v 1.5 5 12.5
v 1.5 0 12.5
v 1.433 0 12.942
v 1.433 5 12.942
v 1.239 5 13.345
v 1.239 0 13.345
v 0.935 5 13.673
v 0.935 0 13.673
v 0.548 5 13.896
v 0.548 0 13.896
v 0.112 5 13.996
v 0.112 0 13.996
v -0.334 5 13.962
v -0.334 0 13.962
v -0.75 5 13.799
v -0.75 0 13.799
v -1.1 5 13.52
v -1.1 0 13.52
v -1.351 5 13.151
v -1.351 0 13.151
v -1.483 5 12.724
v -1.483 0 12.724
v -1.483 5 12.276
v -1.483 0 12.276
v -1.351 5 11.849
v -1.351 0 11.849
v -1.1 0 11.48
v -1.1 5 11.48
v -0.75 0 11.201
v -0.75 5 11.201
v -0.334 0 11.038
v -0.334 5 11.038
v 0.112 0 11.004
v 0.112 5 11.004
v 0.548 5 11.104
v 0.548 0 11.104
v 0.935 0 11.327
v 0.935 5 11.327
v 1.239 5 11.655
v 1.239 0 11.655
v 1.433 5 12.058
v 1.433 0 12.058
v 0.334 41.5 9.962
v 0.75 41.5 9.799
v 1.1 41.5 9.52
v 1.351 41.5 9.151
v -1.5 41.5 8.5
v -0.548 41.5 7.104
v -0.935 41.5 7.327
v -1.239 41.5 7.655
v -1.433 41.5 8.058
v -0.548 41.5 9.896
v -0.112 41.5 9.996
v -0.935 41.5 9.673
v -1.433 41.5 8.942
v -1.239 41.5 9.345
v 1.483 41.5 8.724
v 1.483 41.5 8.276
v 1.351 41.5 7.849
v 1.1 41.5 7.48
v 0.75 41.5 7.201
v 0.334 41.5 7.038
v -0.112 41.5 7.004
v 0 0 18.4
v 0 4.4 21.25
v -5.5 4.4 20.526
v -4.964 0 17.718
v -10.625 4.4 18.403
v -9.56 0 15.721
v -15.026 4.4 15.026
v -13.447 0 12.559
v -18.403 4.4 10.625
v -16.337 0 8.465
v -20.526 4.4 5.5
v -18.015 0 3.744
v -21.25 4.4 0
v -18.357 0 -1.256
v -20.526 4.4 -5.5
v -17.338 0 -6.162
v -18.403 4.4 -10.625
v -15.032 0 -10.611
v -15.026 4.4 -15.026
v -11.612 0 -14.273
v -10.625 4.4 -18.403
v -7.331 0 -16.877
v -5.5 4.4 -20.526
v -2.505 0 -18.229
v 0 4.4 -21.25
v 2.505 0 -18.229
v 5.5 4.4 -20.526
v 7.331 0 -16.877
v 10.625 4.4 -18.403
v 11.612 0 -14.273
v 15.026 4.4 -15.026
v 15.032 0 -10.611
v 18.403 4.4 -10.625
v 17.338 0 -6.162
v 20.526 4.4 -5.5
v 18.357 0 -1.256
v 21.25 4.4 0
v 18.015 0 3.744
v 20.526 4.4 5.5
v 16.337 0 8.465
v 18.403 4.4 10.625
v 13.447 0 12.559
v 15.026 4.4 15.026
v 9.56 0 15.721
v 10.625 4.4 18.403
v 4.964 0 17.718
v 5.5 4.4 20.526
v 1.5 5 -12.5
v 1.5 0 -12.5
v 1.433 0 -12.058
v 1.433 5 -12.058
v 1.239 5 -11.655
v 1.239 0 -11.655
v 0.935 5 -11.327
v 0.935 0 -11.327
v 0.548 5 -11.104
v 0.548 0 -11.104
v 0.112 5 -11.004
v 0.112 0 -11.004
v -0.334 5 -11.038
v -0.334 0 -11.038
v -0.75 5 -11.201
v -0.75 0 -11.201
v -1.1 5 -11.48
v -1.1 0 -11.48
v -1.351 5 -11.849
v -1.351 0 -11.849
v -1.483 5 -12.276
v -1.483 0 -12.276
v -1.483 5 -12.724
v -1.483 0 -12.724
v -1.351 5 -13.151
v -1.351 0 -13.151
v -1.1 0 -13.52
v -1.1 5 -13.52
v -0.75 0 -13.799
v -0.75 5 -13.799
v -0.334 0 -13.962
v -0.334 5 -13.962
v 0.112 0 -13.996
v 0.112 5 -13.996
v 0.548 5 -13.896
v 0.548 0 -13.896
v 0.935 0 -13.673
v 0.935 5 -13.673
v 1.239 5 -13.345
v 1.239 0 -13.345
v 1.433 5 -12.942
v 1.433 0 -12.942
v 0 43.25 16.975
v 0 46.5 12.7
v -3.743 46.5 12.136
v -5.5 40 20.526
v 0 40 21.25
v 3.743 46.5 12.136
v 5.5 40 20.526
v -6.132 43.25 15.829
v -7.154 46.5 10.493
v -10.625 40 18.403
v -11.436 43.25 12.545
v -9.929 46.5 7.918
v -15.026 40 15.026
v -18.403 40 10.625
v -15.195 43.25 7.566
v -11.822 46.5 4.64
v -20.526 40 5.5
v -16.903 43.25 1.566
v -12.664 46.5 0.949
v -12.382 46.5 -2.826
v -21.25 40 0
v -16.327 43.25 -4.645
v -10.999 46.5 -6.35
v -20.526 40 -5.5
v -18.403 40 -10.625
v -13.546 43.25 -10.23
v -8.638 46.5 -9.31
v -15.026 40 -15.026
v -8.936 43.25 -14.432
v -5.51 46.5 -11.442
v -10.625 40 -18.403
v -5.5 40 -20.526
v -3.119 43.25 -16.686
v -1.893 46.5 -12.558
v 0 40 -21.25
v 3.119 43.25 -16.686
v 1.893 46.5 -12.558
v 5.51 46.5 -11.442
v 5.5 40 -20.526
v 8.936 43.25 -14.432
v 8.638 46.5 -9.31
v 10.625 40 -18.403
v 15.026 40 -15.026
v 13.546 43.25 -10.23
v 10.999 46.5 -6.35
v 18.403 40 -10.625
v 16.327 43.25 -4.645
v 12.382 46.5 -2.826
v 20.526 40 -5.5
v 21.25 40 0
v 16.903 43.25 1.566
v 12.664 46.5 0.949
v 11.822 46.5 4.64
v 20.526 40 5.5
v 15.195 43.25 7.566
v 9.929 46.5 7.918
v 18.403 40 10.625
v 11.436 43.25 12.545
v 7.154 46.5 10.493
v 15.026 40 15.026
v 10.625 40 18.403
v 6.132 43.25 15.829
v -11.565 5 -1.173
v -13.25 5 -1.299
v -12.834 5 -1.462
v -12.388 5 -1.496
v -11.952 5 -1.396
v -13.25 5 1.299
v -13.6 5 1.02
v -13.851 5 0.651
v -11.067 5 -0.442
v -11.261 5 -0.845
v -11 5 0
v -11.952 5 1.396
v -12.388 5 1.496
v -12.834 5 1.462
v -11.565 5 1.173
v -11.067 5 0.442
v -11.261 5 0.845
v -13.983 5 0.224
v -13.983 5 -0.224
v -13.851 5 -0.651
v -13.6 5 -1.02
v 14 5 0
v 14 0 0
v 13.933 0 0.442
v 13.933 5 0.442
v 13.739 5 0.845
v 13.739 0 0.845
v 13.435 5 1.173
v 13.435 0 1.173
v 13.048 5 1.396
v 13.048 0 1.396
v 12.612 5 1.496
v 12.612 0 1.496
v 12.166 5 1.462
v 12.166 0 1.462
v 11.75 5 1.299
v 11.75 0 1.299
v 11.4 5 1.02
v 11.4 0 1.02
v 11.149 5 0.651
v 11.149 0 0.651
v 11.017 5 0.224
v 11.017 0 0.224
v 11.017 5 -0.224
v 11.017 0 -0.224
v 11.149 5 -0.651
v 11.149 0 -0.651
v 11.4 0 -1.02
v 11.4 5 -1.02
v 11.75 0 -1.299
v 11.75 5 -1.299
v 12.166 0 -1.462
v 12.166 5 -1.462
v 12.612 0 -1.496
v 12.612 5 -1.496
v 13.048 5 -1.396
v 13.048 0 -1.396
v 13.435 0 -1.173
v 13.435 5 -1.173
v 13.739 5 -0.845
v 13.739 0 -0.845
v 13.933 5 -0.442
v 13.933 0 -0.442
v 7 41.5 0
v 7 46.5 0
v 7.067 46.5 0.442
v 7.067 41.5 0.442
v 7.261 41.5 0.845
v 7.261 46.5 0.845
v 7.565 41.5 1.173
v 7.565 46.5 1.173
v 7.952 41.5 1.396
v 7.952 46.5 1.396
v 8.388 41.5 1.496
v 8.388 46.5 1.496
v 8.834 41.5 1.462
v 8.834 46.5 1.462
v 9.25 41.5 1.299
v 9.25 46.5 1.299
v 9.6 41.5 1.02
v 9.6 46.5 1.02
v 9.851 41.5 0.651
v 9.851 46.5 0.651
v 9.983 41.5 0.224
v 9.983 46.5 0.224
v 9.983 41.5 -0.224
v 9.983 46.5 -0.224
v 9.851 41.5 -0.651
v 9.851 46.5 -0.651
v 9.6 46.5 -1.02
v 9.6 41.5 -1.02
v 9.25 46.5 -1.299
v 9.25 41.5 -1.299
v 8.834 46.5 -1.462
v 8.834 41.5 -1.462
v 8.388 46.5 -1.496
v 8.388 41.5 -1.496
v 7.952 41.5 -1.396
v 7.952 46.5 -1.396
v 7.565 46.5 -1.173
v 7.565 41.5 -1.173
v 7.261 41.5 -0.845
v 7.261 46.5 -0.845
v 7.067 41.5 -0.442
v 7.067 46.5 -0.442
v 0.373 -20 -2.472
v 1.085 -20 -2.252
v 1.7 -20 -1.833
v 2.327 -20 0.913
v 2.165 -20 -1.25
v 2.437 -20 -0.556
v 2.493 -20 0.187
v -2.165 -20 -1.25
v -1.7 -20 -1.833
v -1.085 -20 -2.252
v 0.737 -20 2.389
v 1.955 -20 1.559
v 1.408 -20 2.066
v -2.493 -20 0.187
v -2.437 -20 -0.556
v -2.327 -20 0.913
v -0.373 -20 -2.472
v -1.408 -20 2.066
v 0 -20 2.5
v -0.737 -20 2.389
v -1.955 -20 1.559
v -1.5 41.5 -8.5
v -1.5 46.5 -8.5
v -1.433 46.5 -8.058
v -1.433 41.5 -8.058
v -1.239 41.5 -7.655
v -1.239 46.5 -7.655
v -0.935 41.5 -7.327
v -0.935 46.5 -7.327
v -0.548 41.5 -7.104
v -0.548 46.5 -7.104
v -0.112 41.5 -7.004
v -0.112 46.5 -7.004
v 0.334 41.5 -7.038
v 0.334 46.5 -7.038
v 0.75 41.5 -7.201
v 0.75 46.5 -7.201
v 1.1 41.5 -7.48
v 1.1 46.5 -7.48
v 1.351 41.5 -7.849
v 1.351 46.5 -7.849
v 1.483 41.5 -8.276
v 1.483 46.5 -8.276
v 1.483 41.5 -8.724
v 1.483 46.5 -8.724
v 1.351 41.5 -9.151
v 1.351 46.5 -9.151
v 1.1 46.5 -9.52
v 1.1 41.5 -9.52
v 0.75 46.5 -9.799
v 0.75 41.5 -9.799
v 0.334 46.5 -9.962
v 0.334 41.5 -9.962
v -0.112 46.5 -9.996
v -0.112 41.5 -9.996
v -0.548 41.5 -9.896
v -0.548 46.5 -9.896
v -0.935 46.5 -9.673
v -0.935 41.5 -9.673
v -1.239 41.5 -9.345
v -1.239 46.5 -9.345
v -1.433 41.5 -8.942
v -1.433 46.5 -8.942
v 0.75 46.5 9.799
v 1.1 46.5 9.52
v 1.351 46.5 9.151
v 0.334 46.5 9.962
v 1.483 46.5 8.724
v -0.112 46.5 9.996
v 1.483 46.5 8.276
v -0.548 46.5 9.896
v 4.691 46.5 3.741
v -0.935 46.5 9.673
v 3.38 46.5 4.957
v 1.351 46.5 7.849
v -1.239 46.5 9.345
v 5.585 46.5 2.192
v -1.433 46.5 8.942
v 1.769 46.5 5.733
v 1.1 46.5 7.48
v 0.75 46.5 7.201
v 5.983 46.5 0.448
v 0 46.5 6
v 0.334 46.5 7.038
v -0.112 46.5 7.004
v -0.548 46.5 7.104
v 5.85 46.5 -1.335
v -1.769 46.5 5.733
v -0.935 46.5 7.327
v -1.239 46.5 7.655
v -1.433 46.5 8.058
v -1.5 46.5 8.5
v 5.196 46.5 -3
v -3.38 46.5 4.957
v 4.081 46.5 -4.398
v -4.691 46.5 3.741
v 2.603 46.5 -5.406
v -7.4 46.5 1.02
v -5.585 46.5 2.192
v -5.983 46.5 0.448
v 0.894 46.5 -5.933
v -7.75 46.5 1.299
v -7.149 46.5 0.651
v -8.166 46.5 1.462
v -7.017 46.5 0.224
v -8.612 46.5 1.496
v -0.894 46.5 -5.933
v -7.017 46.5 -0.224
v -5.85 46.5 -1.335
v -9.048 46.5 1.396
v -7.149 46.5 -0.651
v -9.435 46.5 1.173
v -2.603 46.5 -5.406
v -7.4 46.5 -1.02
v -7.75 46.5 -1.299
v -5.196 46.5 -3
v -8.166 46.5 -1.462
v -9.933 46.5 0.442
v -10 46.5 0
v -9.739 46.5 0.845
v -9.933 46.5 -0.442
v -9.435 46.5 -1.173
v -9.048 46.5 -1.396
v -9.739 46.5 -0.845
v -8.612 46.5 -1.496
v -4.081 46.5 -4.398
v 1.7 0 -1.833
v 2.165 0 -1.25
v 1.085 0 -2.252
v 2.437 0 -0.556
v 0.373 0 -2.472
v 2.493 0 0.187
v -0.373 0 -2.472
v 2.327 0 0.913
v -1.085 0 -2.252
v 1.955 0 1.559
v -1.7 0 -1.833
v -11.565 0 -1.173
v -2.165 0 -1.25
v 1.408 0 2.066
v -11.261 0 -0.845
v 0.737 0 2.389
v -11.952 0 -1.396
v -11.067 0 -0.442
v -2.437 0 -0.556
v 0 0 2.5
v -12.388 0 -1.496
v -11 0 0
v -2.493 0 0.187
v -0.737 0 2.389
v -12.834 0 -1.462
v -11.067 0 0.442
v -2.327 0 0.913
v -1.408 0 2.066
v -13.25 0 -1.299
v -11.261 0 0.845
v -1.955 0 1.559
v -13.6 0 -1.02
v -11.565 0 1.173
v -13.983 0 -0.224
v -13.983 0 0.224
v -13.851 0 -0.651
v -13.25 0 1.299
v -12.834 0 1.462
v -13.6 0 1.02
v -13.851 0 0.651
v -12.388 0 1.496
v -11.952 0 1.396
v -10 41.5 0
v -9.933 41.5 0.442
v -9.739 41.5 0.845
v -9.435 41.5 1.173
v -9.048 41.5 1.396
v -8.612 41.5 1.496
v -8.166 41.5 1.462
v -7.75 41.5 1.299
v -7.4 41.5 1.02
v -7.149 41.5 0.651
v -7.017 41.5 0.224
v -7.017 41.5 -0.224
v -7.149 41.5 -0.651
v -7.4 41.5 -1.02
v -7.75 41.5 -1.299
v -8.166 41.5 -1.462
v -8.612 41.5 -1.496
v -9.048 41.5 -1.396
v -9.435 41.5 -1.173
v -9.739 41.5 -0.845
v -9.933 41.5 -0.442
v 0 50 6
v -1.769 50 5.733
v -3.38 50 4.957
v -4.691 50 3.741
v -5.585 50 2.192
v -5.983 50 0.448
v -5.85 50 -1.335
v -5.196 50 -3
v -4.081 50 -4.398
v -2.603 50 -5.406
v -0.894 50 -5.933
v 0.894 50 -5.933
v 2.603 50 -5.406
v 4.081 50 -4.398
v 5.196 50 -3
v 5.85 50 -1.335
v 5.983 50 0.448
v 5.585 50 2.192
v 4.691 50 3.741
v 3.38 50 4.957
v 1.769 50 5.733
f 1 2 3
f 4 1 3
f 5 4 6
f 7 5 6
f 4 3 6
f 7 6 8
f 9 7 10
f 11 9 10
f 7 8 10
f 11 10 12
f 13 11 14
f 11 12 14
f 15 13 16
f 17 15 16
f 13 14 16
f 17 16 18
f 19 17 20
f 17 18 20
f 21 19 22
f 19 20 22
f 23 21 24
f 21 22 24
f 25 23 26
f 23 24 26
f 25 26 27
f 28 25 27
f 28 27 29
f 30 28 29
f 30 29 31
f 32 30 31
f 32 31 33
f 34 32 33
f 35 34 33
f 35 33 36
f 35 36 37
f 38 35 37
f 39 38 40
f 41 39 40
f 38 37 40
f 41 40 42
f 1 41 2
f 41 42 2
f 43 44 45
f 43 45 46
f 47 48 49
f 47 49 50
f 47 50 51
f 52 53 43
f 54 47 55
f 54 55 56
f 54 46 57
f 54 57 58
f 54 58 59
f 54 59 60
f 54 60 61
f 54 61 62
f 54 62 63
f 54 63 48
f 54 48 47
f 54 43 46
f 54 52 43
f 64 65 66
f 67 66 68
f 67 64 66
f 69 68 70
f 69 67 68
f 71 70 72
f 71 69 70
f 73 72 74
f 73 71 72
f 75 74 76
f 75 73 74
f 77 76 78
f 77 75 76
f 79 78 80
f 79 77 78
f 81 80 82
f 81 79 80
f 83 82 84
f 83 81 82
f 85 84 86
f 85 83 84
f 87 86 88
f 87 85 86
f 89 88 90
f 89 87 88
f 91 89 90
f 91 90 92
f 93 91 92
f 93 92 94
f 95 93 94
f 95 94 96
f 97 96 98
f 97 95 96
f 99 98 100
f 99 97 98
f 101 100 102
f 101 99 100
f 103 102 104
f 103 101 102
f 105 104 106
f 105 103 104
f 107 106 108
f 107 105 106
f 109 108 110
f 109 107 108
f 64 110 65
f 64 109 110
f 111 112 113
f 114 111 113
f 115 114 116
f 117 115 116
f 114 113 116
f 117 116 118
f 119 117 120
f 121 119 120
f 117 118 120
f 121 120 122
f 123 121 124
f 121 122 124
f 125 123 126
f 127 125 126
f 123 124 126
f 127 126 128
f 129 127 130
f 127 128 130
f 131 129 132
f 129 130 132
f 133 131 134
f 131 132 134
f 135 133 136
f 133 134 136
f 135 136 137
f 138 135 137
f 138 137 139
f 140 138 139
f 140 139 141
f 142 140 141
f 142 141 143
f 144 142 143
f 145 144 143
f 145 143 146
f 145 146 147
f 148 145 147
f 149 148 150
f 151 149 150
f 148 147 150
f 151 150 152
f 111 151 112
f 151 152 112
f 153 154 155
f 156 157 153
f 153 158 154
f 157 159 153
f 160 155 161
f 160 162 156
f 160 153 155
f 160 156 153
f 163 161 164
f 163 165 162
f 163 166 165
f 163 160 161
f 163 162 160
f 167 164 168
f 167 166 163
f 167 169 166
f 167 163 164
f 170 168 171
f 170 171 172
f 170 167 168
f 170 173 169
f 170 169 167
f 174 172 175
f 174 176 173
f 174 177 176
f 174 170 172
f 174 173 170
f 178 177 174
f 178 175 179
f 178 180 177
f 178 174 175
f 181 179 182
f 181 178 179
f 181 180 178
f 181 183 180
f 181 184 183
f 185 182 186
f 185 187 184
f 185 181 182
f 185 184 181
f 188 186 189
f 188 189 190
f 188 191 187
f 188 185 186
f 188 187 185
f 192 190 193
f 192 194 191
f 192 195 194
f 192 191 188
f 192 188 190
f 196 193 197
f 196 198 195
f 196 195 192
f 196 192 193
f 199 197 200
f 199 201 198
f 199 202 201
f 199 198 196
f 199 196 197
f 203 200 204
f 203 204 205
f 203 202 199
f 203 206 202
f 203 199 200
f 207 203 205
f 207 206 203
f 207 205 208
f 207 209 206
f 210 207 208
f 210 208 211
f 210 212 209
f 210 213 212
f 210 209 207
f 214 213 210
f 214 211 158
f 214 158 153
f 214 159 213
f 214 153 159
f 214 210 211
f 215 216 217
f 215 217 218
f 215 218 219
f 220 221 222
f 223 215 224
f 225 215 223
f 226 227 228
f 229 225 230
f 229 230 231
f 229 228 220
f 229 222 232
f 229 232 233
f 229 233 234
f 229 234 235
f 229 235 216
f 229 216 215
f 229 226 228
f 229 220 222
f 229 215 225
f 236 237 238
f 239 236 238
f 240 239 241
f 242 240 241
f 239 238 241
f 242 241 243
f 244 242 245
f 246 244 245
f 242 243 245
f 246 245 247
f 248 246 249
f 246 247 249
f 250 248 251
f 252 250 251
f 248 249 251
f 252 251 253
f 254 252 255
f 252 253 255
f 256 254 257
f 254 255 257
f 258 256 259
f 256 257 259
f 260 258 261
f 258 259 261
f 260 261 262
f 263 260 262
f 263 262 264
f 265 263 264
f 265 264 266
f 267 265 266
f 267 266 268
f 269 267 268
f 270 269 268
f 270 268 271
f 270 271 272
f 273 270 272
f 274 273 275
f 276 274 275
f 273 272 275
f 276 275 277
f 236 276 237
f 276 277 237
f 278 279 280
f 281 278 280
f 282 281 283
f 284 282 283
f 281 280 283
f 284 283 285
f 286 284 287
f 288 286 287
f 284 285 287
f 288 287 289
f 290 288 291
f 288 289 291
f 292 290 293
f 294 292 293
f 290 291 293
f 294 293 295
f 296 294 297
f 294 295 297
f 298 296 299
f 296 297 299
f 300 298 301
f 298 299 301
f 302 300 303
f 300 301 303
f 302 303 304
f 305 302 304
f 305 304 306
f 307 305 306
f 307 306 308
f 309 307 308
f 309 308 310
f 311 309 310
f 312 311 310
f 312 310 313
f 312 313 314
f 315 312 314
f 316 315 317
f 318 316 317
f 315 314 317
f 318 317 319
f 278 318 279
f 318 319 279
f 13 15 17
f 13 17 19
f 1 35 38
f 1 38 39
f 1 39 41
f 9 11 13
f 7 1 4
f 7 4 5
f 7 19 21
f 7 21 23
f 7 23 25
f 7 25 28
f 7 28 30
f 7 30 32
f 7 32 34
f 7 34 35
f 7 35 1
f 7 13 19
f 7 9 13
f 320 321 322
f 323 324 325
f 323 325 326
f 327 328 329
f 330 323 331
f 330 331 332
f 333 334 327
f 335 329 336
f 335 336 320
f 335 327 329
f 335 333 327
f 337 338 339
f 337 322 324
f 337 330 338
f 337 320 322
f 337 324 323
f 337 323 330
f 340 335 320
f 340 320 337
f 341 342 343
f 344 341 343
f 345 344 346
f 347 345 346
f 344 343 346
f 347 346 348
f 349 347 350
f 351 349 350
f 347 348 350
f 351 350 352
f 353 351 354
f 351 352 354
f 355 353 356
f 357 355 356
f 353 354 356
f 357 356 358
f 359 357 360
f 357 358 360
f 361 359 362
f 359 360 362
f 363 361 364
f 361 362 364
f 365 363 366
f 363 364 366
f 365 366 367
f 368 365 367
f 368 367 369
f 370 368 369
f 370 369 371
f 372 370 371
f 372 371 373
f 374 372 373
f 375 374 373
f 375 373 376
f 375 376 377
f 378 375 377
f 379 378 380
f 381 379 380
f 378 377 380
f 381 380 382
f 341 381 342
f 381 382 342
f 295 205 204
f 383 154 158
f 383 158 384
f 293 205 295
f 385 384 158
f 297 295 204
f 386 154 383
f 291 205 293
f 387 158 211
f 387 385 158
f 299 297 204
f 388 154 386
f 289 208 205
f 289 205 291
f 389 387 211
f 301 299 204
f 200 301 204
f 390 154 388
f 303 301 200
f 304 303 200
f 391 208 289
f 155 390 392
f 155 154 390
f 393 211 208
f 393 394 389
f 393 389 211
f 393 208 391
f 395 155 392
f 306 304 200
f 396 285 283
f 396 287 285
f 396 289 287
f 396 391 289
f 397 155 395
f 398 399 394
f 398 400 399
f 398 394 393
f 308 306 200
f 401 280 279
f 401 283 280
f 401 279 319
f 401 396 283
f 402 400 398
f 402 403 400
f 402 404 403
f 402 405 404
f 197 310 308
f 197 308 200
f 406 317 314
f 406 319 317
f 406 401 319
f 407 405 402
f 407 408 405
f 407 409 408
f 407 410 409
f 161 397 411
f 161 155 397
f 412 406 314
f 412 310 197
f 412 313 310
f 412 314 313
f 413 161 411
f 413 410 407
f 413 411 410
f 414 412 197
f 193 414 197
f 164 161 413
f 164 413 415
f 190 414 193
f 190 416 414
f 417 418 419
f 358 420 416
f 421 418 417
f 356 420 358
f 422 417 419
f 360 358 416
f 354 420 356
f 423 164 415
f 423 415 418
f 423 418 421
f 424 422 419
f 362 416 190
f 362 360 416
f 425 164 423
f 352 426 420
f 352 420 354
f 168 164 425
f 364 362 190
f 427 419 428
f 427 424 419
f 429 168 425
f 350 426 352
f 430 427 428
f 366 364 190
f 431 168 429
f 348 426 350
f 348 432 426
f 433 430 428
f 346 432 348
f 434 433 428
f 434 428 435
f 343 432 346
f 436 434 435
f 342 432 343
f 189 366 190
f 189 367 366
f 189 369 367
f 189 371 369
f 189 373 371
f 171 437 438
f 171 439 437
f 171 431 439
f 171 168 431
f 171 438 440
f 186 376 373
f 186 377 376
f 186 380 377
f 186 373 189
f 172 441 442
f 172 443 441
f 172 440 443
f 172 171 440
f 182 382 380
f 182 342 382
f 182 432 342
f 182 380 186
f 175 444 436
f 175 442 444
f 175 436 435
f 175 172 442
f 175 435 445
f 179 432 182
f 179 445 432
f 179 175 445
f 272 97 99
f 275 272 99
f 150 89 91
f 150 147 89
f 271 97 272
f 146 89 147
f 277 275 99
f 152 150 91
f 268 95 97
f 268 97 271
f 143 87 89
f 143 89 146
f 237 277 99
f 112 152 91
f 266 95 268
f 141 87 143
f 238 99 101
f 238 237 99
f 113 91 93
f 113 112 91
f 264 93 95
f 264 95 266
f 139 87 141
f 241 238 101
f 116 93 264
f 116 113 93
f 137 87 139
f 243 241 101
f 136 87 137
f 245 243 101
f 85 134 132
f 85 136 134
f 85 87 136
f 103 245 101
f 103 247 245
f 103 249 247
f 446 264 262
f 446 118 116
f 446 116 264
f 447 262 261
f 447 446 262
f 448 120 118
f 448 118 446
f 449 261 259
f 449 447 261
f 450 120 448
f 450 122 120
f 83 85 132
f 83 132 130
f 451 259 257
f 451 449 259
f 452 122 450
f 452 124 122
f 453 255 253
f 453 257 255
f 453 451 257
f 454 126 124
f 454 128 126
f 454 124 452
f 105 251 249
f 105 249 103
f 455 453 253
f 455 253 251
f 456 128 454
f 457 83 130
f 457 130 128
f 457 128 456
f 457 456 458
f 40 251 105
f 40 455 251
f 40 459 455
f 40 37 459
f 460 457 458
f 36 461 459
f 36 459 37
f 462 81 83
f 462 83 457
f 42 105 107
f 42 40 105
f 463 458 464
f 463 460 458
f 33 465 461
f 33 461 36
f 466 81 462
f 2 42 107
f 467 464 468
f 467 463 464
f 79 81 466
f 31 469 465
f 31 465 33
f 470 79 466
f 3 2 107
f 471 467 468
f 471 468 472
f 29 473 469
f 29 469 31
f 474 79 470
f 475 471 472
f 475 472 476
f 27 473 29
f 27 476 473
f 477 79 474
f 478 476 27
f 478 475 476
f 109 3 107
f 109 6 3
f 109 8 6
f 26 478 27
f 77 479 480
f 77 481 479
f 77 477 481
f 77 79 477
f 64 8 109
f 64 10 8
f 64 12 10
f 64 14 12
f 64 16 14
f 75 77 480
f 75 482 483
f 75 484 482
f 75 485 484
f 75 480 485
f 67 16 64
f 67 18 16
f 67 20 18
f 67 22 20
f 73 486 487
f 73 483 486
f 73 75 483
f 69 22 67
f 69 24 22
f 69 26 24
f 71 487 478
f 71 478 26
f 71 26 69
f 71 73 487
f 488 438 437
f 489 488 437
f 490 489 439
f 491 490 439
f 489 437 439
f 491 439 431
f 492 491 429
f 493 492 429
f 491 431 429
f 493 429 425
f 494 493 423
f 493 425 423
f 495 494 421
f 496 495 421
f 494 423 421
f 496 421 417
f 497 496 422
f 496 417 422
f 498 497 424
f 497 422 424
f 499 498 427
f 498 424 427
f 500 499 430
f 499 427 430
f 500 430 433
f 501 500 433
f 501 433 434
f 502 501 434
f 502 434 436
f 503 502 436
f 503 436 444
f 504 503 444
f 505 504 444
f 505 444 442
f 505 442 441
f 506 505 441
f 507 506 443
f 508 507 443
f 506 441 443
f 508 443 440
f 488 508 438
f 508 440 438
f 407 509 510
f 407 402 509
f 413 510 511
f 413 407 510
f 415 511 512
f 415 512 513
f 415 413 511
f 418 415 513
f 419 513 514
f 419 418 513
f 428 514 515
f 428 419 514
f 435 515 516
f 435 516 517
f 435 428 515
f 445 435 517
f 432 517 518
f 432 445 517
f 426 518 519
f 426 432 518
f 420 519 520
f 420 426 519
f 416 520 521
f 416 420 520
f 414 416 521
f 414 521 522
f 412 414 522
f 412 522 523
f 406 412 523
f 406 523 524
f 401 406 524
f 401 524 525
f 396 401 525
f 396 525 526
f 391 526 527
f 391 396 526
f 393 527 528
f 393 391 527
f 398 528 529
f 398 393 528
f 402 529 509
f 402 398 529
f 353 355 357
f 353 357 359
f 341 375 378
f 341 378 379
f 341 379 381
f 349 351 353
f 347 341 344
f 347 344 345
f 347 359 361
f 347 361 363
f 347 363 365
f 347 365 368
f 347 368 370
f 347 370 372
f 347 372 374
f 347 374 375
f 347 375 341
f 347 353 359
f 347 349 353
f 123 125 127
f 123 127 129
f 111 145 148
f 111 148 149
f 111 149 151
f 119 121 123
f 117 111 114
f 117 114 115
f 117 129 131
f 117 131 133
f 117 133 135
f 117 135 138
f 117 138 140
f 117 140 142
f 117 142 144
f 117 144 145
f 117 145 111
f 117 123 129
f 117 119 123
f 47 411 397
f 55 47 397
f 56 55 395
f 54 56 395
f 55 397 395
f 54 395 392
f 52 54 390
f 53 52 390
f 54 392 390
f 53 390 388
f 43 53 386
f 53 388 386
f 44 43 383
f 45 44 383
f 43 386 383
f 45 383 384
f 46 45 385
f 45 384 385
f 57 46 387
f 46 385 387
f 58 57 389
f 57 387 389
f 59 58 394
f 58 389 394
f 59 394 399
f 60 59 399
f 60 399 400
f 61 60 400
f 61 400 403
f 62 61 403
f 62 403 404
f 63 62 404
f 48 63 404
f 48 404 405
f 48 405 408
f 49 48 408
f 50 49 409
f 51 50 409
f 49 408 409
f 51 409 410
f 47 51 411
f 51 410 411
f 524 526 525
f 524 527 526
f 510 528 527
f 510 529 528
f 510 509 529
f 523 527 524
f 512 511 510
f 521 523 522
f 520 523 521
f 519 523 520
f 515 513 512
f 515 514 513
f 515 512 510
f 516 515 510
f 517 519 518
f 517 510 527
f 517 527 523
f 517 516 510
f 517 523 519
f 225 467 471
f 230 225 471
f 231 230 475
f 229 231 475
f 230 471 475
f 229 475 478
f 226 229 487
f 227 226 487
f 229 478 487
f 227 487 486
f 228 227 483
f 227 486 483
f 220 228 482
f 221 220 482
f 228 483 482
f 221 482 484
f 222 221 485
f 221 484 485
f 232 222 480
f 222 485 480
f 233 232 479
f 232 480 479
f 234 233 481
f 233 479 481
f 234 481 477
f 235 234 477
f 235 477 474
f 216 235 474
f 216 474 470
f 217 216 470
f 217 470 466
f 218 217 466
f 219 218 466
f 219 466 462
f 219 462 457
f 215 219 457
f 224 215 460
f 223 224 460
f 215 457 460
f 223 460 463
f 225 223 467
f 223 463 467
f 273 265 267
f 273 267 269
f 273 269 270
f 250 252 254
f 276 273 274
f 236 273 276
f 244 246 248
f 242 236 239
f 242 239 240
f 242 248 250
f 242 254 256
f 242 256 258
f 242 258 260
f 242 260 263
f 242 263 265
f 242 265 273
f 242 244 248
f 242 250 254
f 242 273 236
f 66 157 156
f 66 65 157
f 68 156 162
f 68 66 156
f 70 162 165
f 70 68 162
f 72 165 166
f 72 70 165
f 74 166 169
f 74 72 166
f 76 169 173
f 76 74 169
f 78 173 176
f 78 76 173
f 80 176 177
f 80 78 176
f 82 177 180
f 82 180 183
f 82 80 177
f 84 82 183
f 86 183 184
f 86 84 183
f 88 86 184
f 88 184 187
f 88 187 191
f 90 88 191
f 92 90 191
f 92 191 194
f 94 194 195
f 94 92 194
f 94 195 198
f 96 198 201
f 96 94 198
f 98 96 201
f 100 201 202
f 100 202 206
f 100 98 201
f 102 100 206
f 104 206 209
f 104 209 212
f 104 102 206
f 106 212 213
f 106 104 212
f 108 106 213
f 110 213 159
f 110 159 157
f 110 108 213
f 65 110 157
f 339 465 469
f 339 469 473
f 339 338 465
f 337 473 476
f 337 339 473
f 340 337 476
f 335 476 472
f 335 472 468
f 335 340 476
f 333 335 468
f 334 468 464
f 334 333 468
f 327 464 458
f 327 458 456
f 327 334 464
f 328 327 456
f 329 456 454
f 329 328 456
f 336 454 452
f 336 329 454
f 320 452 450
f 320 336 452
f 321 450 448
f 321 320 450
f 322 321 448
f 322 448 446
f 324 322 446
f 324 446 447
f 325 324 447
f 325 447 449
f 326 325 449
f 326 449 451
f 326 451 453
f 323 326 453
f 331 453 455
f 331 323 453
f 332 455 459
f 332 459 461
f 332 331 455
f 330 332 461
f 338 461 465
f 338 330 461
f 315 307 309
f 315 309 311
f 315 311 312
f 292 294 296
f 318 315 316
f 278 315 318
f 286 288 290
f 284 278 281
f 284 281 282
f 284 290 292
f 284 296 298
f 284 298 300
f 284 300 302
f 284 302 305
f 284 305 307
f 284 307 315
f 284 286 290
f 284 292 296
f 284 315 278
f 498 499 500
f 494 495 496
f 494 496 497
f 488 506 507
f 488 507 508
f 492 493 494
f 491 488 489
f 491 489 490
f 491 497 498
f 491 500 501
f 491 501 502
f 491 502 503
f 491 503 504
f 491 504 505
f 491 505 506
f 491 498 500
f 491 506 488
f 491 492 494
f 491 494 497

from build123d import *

# Parameters (mm, degrees)
F2_R     = 1.5
F3_DEPTH = 5
F4_R     = 1.5
F5_DEPTH = 5


with BuildPart() as f1:
    # F0 (on Right) → F1 (revolve)
    with BuildSketch(Plane.YZ):
        Polygon((-20, 2.5), (-20, 0), (50, 0), (50, 6), (46.5, 6), (46.5, 12.7), (40, 21.25), (4.4, 21.25), (0, 18.4), (0, 2.5), align=None)
    revolve(axis=Axis((0, 15, 0), (0, -1, 0)))

    # F2 (on face) → F3 (cut)
    with BuildSketch(Plane.XZ):
        with Locations((12.5, 0)):
            Circle(F2_R)
        with Locations((0, 12.5)):
            Circle(F2_R)
        with Locations((-12.5, 0)):
            Circle(F2_R)
        with Locations((0, -12.5)):
            Circle(F2_R)
    extrude(amount=-F3_DEPTH, mode=Mode.SUBTRACT)

    # F4 (on face) → F5 (cut)
    with BuildSketch(Plane(origin=(0, 46.5, 0), x_dir=(-1, 0, 0), z_dir=(0, 1, 0))):
        with Locations((8.5, 0)):
            Circle(F4_R)
        with Locations((0, 8.5)):
            Circle(F4_R)
        with Locations((-8.5, 0)):
            Circle(F4_R)
        with Locations((0, -8.5)):
            Circle(F4_R)
    extrude(amount=-F5_DEPTH, mode=Mode.SUBTRACT)


solid = f1.part
